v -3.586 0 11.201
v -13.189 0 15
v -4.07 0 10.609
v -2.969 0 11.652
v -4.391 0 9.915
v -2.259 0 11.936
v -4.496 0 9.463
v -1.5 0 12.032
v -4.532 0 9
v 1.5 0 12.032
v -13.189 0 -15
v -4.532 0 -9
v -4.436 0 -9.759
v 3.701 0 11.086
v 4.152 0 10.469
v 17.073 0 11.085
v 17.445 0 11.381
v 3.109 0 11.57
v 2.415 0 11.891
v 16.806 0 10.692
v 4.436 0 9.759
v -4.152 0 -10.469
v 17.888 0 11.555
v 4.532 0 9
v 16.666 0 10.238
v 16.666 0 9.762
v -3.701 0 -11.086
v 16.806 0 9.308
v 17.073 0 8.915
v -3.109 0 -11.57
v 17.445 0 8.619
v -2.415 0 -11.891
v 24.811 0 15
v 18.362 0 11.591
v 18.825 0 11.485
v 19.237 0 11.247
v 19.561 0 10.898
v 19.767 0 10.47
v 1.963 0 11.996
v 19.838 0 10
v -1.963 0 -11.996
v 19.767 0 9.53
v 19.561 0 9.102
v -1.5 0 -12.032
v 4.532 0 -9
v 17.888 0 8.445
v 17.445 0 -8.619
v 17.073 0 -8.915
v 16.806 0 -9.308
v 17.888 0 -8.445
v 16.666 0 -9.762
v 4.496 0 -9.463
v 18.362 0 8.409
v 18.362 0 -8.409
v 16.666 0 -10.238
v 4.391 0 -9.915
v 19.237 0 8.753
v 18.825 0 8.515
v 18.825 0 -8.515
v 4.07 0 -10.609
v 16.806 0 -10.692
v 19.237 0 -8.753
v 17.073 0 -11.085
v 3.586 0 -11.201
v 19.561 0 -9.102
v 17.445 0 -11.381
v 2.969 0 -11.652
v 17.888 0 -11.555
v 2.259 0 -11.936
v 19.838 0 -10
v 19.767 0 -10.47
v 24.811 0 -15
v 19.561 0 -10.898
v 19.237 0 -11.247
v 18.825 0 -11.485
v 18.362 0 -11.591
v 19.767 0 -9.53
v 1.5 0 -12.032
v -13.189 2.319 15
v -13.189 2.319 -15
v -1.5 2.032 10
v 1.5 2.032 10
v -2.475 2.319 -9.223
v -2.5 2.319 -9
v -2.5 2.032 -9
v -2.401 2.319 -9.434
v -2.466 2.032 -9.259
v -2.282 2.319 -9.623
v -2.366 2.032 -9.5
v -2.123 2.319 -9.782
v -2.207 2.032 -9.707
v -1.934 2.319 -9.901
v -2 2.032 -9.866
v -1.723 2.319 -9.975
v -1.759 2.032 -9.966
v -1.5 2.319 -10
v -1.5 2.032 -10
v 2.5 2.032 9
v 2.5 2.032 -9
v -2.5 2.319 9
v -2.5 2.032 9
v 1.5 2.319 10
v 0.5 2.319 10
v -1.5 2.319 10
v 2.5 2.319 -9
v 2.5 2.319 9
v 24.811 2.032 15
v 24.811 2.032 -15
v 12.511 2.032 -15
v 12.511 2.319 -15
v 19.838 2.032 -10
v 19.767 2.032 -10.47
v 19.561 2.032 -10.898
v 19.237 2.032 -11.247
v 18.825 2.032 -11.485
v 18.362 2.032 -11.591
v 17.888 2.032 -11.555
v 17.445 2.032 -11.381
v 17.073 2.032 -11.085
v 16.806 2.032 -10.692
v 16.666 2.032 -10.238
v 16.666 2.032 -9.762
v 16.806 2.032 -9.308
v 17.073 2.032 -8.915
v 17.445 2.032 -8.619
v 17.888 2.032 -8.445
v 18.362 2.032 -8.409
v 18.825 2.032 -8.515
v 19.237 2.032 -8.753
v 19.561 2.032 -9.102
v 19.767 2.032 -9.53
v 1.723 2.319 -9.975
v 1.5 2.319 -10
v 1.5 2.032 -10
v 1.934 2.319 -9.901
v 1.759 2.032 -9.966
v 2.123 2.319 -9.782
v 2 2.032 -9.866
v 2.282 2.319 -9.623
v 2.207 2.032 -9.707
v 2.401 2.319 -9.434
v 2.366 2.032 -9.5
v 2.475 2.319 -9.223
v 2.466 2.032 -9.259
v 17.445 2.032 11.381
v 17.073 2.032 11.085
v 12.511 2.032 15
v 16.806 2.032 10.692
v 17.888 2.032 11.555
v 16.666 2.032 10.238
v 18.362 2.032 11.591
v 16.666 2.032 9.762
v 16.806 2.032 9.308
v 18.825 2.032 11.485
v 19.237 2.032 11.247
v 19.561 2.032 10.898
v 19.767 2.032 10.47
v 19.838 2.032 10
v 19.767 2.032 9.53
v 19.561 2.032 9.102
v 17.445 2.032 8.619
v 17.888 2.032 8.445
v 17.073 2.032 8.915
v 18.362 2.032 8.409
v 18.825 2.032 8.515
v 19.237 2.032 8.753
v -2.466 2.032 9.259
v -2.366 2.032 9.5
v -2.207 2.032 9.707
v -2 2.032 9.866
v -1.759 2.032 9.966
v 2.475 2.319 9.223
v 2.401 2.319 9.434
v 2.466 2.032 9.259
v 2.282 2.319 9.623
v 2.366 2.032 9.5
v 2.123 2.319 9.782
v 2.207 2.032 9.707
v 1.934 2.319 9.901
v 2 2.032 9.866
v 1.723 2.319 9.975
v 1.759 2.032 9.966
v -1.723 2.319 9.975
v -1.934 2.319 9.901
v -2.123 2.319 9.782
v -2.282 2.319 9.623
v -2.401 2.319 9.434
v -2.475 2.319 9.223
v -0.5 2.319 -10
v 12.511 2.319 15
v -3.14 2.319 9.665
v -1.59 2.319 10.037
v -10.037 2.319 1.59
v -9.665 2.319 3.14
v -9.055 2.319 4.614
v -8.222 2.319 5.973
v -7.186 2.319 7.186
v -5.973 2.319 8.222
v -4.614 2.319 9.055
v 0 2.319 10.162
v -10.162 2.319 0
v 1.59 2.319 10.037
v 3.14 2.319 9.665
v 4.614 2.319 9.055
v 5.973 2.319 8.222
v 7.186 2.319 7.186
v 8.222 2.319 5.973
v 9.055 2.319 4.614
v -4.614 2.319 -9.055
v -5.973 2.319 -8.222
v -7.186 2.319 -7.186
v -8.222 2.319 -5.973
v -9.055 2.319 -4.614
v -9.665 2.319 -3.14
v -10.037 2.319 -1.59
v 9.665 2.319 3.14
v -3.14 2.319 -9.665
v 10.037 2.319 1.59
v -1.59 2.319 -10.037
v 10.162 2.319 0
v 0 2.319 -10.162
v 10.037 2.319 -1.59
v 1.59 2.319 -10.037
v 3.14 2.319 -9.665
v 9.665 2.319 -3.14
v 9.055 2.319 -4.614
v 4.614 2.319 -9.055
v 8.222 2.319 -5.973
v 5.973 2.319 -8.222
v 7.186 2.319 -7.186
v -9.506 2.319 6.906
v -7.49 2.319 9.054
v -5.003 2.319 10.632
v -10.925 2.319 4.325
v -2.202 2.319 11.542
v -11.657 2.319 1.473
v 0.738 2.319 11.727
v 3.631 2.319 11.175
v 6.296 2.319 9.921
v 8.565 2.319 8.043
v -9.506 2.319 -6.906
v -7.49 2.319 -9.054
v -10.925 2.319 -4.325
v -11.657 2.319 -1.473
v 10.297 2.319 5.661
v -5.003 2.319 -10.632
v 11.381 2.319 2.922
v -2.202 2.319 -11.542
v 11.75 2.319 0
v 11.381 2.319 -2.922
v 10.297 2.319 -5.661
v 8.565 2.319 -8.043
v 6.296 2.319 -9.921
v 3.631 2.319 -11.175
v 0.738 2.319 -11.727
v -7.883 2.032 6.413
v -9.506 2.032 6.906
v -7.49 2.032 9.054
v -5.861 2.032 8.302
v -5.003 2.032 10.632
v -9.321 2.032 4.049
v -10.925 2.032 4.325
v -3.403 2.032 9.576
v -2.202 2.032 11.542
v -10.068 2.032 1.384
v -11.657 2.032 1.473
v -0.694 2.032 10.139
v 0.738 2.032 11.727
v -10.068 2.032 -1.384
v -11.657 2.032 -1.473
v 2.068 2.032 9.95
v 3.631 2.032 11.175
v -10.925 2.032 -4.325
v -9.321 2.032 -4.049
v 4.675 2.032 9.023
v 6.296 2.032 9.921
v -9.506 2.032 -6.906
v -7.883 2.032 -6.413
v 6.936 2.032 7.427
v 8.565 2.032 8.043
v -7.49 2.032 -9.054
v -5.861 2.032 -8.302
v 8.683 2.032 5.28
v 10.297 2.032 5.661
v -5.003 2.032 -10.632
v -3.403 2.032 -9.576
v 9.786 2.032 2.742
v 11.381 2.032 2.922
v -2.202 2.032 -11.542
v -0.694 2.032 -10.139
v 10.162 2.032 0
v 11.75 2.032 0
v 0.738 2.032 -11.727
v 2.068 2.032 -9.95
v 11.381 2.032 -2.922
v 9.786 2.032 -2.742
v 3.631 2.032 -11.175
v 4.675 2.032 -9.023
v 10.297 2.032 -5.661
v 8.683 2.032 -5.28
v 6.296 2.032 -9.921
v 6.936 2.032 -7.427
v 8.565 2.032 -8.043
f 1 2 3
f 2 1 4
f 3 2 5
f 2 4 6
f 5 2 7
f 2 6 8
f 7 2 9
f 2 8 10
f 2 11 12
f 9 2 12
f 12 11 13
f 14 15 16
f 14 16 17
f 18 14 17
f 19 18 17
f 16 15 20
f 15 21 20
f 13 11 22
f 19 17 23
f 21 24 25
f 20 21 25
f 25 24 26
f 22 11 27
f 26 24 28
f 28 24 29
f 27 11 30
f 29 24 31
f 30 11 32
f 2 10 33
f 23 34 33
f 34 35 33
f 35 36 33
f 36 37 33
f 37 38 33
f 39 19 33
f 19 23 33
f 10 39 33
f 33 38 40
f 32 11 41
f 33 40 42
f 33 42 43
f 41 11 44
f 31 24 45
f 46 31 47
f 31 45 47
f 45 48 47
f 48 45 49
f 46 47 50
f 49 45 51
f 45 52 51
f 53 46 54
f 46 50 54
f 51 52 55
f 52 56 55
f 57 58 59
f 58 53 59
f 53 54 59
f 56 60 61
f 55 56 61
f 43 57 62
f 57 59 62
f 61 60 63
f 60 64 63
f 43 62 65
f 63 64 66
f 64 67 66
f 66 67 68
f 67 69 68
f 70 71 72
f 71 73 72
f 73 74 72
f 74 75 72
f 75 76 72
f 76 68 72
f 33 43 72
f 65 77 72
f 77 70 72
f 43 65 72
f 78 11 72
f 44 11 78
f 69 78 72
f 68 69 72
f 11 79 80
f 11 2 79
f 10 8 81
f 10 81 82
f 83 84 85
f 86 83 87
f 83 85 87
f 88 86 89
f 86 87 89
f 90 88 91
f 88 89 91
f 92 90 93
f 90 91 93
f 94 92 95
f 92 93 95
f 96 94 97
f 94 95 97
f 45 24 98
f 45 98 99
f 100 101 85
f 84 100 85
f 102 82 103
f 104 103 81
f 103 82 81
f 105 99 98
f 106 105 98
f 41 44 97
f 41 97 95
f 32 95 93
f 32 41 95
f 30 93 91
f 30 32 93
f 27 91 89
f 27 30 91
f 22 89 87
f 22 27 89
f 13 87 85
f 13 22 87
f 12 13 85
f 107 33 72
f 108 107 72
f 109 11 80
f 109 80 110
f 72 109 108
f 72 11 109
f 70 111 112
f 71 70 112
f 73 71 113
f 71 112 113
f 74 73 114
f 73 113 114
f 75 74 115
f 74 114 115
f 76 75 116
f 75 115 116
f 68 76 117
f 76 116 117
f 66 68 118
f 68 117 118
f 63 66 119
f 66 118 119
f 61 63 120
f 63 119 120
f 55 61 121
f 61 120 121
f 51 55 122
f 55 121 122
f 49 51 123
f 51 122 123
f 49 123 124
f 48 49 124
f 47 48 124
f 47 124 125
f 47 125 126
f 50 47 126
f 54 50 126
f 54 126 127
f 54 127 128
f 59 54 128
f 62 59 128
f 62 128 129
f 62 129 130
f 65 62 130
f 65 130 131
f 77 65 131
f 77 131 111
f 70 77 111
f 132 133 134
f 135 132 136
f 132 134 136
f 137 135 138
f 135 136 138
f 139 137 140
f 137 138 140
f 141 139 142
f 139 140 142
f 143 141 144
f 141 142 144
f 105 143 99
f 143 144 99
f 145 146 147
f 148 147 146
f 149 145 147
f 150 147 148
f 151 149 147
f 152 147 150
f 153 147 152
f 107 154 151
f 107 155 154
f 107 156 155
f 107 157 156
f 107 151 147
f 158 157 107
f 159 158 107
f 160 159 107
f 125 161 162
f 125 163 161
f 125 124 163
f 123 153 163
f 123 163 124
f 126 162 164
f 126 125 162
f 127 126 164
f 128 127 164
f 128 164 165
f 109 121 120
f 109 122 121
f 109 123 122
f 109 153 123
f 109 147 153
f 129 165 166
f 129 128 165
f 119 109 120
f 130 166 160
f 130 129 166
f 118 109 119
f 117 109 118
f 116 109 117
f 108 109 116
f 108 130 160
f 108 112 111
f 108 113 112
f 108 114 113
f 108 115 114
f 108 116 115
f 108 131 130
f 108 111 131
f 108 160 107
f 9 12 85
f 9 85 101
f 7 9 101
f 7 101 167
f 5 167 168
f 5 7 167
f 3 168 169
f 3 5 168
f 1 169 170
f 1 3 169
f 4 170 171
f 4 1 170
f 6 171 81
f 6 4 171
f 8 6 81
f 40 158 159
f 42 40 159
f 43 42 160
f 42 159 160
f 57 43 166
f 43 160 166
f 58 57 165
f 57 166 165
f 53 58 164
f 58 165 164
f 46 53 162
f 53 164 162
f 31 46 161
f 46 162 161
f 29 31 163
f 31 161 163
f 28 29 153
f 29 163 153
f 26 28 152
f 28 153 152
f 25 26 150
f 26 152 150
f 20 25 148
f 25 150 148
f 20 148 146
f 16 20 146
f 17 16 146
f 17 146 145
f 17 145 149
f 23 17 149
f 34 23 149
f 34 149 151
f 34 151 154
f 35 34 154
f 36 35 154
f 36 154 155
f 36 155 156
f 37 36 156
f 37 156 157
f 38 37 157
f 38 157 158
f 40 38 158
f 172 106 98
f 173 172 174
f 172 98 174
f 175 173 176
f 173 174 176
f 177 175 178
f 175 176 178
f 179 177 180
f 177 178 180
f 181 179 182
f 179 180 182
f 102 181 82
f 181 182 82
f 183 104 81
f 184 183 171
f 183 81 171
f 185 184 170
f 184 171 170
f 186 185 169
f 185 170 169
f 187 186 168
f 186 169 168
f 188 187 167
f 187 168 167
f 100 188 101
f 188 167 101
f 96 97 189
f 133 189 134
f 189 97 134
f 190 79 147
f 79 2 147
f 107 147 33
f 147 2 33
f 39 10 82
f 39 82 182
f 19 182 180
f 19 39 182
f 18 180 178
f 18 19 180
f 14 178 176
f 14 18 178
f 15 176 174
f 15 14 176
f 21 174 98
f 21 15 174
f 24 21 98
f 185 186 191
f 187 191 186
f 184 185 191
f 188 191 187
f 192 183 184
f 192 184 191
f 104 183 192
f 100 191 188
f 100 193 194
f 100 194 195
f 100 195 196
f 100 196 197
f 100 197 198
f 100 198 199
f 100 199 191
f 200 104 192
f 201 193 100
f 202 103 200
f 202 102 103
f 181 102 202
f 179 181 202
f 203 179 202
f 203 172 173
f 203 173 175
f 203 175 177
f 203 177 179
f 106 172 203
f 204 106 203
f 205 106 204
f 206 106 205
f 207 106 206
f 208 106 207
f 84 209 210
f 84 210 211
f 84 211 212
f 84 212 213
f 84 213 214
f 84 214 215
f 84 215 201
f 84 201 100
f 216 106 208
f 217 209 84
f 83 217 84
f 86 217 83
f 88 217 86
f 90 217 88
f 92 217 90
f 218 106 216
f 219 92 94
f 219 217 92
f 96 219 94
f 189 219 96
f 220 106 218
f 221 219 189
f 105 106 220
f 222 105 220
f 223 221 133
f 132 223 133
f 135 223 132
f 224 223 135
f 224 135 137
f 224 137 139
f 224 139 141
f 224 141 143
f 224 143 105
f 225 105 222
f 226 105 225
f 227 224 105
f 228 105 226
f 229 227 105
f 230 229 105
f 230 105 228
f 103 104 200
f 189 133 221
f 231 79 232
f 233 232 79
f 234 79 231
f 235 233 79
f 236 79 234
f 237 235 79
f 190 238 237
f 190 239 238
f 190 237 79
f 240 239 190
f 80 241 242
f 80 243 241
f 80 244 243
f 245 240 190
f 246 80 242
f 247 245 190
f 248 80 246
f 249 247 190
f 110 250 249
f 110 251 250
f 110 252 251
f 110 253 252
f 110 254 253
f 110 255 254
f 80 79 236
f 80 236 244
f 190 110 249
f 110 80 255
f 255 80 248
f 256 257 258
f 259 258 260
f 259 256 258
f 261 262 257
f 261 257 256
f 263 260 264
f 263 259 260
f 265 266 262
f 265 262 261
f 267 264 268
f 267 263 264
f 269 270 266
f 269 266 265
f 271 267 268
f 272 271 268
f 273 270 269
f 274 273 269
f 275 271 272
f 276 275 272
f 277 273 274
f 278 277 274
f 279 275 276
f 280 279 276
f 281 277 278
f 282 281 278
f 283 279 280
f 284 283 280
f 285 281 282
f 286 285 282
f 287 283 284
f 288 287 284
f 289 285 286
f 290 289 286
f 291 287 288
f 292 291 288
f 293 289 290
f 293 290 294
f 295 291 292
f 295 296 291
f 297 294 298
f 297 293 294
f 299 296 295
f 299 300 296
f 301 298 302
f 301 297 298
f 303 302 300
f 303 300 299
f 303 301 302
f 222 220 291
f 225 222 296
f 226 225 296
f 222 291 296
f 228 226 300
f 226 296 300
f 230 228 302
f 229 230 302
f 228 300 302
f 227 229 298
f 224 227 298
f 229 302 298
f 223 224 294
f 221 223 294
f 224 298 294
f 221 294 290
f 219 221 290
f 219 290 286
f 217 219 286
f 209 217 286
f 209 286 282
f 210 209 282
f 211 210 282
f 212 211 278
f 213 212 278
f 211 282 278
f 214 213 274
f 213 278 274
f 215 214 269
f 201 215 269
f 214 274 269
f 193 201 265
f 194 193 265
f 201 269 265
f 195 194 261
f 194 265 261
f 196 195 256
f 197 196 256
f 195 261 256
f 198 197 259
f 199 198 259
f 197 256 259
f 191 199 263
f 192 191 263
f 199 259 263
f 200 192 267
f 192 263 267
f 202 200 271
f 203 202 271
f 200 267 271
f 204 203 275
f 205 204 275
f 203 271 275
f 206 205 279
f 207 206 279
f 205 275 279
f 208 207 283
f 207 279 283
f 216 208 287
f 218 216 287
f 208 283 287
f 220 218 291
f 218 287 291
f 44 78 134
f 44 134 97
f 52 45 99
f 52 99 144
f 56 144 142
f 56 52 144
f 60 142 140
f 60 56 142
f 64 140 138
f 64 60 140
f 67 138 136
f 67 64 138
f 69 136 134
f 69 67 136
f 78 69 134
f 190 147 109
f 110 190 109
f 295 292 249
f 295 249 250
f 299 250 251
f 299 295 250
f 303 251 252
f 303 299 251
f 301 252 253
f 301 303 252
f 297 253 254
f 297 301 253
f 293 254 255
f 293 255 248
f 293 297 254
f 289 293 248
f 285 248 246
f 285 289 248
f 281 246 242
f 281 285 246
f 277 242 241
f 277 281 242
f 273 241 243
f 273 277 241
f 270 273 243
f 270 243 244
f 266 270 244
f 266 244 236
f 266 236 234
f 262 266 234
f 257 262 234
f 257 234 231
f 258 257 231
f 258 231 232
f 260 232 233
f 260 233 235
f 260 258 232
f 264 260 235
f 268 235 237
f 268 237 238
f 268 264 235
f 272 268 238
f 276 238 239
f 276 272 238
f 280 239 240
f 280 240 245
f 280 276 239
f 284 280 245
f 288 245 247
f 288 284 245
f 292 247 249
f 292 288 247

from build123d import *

# Parameters (mm, degrees)
SKETCH2_W           = 38
SKETCH2_H           = 30
BOSS_EXTRUDE1_DEPTH = 2.032
CUT_EXTRUDE4_DEPTH  = 3.032
CUT_EXTRUDE4_TAPER  = -45
SKETCH5_R           = 1.595
CUT_EXTRUDE5_DEPTH  = 3.0320001
SKETCH6_W           = 25.7
SKETCH6_H           = 30
SKETCH6_R           = 11.75
SKETCH6_R_2         = 10.1625
BOSS_EXTRUDE4_DEPTH = 0.2874


with BuildPart() as part:
    # Sketch2 → Boss-Extrude1 (new body)
    with BuildSketch(Plane(origin=(0, 0, 0), x_dir=(1, 0, 0), z_dir=(0, 1, 0))):
        with Locations((5.811028754, 0)):
            Rectangle(SKETCH2_W, SKETCH2_H)
    extrude(amount=BOSS_EXTRUDE1_DEPTH)

    # Sketch4 → Cut-Extrude4 (cut, through all)
    with BuildSketch(Plane(origin=(0, 2.032, 0), x_dir=(1, 0, 0), z_dir=(0, 1, 0))):
        with BuildLine():
            ThreePointArc((1.5, -10), (2.207106781, -9.707106781), (2.5, -9))
            Line((2.5, -9), (2.5, 9))
            ThreePointArc((2.5, 9), (2.207106781, 9.707106781), (1.5, 10))
            Line((1.5, 10), (-1.5, 10))
            ThreePointArc((-1.5, 10), (-2.207106781, 9.707106781), (-2.5, 9))
            Line((-2.5, 9), (-2.5, -9))
            ThreePointArc((-2.5, -9), (-2.207106781, -9.707106781), (-1.5, -10))
            Line((-1.5, -10), (1.5, -10))
        make_face()
    extrude(amount=-CUT_EXTRUDE4_DEPTH, taper=CUT_EXTRUDE4_TAPER, mode=Mode.SUBTRACT)

    # Sketch5 → Cut-Extrude5 (cut, through all)
    with BuildSketch(Plane(origin=(0, 2.032, 0), x_dir=(1, 0, 0), z_dir=(0, 1, 0))):
        with Locations((18.242707696, -10)):
            Circle(SKETCH5_R)
        with Locations((18.242707696, 10)):
            Circle(SKETCH5_R)
    extrude(amount=-CUT_EXTRUDE5_DEPTH, mode=Mode.SUBTRACT)

    # Sketch6 → Boss-Extrude4 (add)
    with BuildSketch(Plane(origin=(0, 2.032, 0), x_dir=(1, 0, 0), z_dir=(0, 1, 0))):
        with Locations((-0.338971246, 0)):
            Rectangle(SKETCH6_W, SKETCH6_H)
        Circle(SKETCH6_R, mode=Mode.SUBTRACT)
        Circle(SKETCH6_R_2)
        with BuildLine():
            Line((1.5, -10), (-1.5, -10))
            ThreePointArc((-1.5, -10), (-2.207106781, -9.707106781), (-2.5, -9))
            Line((-2.5, -9), (-2.5, 9))
            ThreePointArc((-2.5, 9), (-2.207106781, 9.707106781), (-1.5, 10))
            Line((-1.5, 10), (1.5, 10))
            ThreePointArc((1.5, 10), (2.207106781, 9.707106781), (2.5, 9))
            Line((2.5, 9), (2.5, -9))
            ThreePointArc((2.5, -9), (2.207106781, -9.707106781), (1.5, -10))
        make_face(mode=Mode.SUBTRACT)
    extrude(amount=BOSS_EXTRUDE4_DEPTH)


solid = part.part
